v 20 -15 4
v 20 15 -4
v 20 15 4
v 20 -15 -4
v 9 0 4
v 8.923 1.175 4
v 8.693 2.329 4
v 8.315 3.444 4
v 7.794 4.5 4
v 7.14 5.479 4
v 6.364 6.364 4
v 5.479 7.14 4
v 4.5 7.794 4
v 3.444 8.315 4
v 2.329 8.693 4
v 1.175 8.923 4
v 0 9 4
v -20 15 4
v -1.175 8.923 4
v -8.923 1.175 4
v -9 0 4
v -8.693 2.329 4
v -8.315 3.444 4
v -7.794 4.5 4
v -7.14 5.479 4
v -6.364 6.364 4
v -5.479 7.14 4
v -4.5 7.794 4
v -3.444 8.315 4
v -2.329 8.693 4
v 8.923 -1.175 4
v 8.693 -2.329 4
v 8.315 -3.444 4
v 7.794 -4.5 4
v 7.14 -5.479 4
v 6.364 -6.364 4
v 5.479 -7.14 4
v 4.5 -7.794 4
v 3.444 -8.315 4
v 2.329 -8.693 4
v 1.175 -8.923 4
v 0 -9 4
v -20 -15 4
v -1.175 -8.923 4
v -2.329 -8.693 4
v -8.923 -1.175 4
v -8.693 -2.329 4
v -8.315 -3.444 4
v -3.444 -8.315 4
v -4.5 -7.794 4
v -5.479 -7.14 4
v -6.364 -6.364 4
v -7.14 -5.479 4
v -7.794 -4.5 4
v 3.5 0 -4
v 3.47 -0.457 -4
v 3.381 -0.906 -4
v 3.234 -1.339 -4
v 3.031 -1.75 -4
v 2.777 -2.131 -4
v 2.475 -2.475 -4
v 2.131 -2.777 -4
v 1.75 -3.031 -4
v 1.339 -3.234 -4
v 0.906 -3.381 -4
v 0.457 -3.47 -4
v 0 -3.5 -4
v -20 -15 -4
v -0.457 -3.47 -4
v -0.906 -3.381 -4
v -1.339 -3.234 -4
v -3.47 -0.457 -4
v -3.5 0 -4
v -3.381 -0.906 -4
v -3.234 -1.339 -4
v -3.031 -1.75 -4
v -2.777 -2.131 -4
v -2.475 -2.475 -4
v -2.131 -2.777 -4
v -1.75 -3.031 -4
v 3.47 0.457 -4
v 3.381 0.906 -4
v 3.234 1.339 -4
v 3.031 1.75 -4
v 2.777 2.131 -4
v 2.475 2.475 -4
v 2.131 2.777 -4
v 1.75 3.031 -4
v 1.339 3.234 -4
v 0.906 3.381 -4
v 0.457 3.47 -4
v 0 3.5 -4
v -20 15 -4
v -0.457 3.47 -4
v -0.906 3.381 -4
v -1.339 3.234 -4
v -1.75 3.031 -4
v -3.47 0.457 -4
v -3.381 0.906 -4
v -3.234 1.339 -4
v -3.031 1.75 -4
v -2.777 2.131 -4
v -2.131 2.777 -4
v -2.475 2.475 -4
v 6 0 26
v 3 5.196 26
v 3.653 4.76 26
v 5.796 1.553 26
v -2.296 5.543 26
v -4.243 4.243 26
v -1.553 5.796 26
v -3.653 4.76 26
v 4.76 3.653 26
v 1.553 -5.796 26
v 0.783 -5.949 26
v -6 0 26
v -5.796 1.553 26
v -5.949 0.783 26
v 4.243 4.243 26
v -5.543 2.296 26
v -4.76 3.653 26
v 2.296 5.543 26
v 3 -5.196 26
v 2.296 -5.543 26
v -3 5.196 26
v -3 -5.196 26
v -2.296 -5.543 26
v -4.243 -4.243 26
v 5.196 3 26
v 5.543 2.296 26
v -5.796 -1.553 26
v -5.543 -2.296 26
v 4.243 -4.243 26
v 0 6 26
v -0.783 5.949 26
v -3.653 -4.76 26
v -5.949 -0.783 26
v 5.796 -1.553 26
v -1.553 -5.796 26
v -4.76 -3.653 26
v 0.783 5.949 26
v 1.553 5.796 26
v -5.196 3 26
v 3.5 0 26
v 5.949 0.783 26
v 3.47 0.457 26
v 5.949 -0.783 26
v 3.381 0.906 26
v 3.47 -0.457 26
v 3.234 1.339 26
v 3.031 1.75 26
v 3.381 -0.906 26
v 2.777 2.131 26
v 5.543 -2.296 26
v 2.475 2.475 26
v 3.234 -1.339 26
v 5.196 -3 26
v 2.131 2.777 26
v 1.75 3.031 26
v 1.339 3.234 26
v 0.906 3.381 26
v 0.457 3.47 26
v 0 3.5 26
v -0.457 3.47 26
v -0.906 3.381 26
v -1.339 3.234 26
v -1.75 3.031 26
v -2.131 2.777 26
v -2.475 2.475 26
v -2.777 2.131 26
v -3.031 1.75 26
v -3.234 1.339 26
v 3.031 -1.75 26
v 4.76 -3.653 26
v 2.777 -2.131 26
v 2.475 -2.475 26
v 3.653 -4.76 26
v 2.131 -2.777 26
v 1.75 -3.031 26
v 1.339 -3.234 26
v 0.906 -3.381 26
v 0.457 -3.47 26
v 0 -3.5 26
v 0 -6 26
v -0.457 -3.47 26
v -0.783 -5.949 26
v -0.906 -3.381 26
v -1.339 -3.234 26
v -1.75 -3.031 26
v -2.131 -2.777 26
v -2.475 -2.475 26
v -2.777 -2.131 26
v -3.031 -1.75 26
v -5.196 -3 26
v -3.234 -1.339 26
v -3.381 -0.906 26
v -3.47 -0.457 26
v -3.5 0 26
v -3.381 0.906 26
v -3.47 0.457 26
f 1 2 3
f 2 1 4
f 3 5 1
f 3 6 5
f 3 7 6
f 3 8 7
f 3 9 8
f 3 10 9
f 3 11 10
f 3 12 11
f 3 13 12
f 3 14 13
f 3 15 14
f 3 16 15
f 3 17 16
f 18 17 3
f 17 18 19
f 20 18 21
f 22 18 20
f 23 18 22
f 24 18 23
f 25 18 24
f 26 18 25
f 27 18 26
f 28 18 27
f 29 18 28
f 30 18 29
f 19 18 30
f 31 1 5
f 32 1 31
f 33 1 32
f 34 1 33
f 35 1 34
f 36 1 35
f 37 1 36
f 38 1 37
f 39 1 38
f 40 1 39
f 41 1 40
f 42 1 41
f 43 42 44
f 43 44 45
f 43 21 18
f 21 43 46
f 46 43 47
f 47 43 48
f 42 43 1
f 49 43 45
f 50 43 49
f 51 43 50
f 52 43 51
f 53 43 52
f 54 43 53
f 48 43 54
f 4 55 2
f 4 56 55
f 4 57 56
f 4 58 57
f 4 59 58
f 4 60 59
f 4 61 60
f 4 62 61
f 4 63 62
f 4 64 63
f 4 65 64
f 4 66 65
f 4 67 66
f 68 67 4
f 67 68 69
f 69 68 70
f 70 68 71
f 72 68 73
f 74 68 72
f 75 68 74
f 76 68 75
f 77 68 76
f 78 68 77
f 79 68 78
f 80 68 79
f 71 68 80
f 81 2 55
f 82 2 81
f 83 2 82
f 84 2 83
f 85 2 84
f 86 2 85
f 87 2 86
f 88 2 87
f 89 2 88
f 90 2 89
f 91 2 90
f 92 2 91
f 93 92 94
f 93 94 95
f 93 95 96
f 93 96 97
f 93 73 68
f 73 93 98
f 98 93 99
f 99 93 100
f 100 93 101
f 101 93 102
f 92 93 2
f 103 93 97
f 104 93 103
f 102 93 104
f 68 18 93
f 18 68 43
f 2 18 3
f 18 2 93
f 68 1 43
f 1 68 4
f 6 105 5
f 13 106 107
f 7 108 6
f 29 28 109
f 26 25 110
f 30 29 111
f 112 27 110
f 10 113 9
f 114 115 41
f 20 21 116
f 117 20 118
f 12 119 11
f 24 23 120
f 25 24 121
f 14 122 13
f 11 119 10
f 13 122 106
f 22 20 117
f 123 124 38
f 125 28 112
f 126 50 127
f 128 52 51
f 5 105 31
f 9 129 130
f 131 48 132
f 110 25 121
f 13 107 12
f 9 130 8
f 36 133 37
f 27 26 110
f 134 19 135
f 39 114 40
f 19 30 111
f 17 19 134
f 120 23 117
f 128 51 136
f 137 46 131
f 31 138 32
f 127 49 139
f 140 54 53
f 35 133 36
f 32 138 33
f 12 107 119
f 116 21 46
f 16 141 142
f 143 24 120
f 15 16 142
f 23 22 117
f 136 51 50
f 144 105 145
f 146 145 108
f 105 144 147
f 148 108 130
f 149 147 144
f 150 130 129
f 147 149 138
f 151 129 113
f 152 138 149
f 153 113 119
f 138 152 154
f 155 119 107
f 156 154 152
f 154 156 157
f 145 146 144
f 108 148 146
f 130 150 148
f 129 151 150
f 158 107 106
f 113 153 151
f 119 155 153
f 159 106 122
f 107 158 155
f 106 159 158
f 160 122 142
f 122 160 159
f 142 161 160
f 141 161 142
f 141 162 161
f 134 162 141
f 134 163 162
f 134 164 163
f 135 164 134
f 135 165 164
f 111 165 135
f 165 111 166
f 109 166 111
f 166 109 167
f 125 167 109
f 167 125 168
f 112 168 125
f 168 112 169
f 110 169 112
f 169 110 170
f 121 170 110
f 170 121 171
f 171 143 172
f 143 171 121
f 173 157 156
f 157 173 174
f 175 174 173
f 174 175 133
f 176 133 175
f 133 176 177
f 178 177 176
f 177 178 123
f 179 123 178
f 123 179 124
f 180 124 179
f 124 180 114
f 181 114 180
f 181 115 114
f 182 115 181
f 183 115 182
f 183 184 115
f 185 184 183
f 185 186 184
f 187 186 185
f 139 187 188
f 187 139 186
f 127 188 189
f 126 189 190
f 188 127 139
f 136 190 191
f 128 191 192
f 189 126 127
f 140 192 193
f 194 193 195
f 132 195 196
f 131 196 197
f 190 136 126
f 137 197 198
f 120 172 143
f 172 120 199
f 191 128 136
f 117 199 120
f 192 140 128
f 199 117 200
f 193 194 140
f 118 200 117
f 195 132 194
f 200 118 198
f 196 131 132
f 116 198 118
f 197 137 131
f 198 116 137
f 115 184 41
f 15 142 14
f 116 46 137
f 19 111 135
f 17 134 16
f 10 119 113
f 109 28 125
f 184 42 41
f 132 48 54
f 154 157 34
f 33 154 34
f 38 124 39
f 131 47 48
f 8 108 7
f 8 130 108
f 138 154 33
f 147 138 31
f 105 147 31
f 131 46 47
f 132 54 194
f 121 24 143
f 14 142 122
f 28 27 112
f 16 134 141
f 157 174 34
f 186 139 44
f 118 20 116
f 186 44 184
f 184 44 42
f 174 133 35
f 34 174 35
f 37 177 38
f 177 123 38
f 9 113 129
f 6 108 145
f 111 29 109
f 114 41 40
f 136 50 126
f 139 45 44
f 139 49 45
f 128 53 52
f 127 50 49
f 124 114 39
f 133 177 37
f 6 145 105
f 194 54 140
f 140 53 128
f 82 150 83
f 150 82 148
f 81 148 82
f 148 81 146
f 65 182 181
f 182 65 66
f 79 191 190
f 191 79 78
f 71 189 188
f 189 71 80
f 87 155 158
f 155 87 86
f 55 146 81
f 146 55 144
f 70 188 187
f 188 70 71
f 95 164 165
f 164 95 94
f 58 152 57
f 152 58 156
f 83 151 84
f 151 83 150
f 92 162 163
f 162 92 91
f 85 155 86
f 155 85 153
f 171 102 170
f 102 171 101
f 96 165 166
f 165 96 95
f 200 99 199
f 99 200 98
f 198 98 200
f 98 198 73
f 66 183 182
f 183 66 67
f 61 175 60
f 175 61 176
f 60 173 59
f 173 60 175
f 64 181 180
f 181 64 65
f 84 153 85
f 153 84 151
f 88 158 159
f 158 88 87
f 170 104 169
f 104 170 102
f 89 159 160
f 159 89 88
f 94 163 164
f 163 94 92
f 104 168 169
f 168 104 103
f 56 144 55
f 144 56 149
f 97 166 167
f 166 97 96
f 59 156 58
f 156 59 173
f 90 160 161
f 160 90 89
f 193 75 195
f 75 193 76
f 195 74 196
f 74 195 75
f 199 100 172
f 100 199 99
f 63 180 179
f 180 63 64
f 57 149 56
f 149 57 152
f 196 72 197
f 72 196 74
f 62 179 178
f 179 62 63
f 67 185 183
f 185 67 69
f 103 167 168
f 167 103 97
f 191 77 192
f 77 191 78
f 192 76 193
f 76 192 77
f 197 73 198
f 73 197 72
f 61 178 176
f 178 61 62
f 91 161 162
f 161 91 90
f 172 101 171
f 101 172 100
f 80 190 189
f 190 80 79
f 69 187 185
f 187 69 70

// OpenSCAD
// Ordinary OpenSCAD source used to exercise WaifuCAD's external evaluator path.
$fn = 48;

difference() {
    union() {
        cube([40, 30, 8], center=true);
        translate([0, 0, 4]) cylinder(h=22, r1=9, r2=6);
    }
    translate([0, 0, -10]) cylinder(h=40, r=3.5);
}
